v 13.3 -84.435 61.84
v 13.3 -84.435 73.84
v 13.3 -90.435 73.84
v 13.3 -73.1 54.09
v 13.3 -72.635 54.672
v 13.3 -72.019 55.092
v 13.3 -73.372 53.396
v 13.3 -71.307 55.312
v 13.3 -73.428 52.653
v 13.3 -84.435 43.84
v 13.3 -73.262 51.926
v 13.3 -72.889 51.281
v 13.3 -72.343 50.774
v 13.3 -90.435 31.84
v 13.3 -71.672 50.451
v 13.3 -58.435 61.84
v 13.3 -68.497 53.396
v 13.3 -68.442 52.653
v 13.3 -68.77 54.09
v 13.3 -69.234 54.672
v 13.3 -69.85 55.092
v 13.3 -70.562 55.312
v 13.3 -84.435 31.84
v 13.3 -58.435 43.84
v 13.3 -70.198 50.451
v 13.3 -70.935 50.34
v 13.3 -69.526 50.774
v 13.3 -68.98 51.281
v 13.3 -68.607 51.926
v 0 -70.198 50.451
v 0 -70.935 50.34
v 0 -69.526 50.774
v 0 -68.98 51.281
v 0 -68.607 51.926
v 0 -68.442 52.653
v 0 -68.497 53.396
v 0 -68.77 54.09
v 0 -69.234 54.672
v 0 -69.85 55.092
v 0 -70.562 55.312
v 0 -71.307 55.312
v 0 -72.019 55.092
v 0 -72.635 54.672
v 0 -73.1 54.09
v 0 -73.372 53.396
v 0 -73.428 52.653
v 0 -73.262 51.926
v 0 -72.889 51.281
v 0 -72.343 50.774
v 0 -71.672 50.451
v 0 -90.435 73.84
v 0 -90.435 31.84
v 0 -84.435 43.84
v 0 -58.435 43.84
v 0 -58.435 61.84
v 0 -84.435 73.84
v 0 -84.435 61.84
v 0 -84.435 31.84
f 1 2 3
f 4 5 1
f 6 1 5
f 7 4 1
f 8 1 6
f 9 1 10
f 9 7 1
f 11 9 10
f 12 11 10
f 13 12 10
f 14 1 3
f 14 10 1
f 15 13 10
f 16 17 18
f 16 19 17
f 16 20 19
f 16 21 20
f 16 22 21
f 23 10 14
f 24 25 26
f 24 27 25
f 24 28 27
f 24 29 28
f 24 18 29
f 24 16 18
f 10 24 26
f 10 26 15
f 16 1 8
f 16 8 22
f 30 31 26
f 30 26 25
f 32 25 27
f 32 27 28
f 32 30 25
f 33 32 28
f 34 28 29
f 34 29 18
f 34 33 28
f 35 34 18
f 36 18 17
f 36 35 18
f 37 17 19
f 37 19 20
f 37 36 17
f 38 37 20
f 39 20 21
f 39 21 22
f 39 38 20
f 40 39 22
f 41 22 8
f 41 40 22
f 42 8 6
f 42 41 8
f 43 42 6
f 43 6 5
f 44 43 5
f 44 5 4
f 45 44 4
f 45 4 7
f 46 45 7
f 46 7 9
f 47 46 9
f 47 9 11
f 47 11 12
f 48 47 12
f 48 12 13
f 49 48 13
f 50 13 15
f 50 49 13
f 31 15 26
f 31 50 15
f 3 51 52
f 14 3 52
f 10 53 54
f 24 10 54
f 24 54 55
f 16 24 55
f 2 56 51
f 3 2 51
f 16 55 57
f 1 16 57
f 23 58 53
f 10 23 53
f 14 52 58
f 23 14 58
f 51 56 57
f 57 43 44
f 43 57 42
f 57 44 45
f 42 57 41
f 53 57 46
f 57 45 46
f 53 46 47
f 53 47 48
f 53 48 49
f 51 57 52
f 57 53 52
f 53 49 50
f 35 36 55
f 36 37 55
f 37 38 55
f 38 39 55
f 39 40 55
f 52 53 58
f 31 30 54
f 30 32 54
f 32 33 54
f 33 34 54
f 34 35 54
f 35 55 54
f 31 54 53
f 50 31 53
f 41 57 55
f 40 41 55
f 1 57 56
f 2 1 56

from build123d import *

# Parameters (mm, degrees)
SKETCH_1_R      = 2.5
EXTRUDE_1_DEPTH = 13.3


with BuildPart() as part:
    # 草图1 → 凸台-拉伸1 (new body)
    with BuildSketch(Plane(origin=(0, 0, 0), x_dir=(0, 0, -1), z_dir=(1, 0, 0))):
        Polygon((-73.839514953, -90.434627318), (-31.839514953, -90.434627318), (-31.839514953, -84.434627318), (-43.839514953, -84.434627318), (-43.839514953, -58.434627318), (-61.839514953, -58.434627318), (-61.839514953, -84.434627318), (-73.839514953, -84.434627318), align=None)
        with Locations((-52.839514953, -70.934627318)):
            Circle(SKETCH_1_R, mode=Mode.SUBTRACT)
    extrude(amount=EXTRUDE_1_DEPTH)


solid = part.part
